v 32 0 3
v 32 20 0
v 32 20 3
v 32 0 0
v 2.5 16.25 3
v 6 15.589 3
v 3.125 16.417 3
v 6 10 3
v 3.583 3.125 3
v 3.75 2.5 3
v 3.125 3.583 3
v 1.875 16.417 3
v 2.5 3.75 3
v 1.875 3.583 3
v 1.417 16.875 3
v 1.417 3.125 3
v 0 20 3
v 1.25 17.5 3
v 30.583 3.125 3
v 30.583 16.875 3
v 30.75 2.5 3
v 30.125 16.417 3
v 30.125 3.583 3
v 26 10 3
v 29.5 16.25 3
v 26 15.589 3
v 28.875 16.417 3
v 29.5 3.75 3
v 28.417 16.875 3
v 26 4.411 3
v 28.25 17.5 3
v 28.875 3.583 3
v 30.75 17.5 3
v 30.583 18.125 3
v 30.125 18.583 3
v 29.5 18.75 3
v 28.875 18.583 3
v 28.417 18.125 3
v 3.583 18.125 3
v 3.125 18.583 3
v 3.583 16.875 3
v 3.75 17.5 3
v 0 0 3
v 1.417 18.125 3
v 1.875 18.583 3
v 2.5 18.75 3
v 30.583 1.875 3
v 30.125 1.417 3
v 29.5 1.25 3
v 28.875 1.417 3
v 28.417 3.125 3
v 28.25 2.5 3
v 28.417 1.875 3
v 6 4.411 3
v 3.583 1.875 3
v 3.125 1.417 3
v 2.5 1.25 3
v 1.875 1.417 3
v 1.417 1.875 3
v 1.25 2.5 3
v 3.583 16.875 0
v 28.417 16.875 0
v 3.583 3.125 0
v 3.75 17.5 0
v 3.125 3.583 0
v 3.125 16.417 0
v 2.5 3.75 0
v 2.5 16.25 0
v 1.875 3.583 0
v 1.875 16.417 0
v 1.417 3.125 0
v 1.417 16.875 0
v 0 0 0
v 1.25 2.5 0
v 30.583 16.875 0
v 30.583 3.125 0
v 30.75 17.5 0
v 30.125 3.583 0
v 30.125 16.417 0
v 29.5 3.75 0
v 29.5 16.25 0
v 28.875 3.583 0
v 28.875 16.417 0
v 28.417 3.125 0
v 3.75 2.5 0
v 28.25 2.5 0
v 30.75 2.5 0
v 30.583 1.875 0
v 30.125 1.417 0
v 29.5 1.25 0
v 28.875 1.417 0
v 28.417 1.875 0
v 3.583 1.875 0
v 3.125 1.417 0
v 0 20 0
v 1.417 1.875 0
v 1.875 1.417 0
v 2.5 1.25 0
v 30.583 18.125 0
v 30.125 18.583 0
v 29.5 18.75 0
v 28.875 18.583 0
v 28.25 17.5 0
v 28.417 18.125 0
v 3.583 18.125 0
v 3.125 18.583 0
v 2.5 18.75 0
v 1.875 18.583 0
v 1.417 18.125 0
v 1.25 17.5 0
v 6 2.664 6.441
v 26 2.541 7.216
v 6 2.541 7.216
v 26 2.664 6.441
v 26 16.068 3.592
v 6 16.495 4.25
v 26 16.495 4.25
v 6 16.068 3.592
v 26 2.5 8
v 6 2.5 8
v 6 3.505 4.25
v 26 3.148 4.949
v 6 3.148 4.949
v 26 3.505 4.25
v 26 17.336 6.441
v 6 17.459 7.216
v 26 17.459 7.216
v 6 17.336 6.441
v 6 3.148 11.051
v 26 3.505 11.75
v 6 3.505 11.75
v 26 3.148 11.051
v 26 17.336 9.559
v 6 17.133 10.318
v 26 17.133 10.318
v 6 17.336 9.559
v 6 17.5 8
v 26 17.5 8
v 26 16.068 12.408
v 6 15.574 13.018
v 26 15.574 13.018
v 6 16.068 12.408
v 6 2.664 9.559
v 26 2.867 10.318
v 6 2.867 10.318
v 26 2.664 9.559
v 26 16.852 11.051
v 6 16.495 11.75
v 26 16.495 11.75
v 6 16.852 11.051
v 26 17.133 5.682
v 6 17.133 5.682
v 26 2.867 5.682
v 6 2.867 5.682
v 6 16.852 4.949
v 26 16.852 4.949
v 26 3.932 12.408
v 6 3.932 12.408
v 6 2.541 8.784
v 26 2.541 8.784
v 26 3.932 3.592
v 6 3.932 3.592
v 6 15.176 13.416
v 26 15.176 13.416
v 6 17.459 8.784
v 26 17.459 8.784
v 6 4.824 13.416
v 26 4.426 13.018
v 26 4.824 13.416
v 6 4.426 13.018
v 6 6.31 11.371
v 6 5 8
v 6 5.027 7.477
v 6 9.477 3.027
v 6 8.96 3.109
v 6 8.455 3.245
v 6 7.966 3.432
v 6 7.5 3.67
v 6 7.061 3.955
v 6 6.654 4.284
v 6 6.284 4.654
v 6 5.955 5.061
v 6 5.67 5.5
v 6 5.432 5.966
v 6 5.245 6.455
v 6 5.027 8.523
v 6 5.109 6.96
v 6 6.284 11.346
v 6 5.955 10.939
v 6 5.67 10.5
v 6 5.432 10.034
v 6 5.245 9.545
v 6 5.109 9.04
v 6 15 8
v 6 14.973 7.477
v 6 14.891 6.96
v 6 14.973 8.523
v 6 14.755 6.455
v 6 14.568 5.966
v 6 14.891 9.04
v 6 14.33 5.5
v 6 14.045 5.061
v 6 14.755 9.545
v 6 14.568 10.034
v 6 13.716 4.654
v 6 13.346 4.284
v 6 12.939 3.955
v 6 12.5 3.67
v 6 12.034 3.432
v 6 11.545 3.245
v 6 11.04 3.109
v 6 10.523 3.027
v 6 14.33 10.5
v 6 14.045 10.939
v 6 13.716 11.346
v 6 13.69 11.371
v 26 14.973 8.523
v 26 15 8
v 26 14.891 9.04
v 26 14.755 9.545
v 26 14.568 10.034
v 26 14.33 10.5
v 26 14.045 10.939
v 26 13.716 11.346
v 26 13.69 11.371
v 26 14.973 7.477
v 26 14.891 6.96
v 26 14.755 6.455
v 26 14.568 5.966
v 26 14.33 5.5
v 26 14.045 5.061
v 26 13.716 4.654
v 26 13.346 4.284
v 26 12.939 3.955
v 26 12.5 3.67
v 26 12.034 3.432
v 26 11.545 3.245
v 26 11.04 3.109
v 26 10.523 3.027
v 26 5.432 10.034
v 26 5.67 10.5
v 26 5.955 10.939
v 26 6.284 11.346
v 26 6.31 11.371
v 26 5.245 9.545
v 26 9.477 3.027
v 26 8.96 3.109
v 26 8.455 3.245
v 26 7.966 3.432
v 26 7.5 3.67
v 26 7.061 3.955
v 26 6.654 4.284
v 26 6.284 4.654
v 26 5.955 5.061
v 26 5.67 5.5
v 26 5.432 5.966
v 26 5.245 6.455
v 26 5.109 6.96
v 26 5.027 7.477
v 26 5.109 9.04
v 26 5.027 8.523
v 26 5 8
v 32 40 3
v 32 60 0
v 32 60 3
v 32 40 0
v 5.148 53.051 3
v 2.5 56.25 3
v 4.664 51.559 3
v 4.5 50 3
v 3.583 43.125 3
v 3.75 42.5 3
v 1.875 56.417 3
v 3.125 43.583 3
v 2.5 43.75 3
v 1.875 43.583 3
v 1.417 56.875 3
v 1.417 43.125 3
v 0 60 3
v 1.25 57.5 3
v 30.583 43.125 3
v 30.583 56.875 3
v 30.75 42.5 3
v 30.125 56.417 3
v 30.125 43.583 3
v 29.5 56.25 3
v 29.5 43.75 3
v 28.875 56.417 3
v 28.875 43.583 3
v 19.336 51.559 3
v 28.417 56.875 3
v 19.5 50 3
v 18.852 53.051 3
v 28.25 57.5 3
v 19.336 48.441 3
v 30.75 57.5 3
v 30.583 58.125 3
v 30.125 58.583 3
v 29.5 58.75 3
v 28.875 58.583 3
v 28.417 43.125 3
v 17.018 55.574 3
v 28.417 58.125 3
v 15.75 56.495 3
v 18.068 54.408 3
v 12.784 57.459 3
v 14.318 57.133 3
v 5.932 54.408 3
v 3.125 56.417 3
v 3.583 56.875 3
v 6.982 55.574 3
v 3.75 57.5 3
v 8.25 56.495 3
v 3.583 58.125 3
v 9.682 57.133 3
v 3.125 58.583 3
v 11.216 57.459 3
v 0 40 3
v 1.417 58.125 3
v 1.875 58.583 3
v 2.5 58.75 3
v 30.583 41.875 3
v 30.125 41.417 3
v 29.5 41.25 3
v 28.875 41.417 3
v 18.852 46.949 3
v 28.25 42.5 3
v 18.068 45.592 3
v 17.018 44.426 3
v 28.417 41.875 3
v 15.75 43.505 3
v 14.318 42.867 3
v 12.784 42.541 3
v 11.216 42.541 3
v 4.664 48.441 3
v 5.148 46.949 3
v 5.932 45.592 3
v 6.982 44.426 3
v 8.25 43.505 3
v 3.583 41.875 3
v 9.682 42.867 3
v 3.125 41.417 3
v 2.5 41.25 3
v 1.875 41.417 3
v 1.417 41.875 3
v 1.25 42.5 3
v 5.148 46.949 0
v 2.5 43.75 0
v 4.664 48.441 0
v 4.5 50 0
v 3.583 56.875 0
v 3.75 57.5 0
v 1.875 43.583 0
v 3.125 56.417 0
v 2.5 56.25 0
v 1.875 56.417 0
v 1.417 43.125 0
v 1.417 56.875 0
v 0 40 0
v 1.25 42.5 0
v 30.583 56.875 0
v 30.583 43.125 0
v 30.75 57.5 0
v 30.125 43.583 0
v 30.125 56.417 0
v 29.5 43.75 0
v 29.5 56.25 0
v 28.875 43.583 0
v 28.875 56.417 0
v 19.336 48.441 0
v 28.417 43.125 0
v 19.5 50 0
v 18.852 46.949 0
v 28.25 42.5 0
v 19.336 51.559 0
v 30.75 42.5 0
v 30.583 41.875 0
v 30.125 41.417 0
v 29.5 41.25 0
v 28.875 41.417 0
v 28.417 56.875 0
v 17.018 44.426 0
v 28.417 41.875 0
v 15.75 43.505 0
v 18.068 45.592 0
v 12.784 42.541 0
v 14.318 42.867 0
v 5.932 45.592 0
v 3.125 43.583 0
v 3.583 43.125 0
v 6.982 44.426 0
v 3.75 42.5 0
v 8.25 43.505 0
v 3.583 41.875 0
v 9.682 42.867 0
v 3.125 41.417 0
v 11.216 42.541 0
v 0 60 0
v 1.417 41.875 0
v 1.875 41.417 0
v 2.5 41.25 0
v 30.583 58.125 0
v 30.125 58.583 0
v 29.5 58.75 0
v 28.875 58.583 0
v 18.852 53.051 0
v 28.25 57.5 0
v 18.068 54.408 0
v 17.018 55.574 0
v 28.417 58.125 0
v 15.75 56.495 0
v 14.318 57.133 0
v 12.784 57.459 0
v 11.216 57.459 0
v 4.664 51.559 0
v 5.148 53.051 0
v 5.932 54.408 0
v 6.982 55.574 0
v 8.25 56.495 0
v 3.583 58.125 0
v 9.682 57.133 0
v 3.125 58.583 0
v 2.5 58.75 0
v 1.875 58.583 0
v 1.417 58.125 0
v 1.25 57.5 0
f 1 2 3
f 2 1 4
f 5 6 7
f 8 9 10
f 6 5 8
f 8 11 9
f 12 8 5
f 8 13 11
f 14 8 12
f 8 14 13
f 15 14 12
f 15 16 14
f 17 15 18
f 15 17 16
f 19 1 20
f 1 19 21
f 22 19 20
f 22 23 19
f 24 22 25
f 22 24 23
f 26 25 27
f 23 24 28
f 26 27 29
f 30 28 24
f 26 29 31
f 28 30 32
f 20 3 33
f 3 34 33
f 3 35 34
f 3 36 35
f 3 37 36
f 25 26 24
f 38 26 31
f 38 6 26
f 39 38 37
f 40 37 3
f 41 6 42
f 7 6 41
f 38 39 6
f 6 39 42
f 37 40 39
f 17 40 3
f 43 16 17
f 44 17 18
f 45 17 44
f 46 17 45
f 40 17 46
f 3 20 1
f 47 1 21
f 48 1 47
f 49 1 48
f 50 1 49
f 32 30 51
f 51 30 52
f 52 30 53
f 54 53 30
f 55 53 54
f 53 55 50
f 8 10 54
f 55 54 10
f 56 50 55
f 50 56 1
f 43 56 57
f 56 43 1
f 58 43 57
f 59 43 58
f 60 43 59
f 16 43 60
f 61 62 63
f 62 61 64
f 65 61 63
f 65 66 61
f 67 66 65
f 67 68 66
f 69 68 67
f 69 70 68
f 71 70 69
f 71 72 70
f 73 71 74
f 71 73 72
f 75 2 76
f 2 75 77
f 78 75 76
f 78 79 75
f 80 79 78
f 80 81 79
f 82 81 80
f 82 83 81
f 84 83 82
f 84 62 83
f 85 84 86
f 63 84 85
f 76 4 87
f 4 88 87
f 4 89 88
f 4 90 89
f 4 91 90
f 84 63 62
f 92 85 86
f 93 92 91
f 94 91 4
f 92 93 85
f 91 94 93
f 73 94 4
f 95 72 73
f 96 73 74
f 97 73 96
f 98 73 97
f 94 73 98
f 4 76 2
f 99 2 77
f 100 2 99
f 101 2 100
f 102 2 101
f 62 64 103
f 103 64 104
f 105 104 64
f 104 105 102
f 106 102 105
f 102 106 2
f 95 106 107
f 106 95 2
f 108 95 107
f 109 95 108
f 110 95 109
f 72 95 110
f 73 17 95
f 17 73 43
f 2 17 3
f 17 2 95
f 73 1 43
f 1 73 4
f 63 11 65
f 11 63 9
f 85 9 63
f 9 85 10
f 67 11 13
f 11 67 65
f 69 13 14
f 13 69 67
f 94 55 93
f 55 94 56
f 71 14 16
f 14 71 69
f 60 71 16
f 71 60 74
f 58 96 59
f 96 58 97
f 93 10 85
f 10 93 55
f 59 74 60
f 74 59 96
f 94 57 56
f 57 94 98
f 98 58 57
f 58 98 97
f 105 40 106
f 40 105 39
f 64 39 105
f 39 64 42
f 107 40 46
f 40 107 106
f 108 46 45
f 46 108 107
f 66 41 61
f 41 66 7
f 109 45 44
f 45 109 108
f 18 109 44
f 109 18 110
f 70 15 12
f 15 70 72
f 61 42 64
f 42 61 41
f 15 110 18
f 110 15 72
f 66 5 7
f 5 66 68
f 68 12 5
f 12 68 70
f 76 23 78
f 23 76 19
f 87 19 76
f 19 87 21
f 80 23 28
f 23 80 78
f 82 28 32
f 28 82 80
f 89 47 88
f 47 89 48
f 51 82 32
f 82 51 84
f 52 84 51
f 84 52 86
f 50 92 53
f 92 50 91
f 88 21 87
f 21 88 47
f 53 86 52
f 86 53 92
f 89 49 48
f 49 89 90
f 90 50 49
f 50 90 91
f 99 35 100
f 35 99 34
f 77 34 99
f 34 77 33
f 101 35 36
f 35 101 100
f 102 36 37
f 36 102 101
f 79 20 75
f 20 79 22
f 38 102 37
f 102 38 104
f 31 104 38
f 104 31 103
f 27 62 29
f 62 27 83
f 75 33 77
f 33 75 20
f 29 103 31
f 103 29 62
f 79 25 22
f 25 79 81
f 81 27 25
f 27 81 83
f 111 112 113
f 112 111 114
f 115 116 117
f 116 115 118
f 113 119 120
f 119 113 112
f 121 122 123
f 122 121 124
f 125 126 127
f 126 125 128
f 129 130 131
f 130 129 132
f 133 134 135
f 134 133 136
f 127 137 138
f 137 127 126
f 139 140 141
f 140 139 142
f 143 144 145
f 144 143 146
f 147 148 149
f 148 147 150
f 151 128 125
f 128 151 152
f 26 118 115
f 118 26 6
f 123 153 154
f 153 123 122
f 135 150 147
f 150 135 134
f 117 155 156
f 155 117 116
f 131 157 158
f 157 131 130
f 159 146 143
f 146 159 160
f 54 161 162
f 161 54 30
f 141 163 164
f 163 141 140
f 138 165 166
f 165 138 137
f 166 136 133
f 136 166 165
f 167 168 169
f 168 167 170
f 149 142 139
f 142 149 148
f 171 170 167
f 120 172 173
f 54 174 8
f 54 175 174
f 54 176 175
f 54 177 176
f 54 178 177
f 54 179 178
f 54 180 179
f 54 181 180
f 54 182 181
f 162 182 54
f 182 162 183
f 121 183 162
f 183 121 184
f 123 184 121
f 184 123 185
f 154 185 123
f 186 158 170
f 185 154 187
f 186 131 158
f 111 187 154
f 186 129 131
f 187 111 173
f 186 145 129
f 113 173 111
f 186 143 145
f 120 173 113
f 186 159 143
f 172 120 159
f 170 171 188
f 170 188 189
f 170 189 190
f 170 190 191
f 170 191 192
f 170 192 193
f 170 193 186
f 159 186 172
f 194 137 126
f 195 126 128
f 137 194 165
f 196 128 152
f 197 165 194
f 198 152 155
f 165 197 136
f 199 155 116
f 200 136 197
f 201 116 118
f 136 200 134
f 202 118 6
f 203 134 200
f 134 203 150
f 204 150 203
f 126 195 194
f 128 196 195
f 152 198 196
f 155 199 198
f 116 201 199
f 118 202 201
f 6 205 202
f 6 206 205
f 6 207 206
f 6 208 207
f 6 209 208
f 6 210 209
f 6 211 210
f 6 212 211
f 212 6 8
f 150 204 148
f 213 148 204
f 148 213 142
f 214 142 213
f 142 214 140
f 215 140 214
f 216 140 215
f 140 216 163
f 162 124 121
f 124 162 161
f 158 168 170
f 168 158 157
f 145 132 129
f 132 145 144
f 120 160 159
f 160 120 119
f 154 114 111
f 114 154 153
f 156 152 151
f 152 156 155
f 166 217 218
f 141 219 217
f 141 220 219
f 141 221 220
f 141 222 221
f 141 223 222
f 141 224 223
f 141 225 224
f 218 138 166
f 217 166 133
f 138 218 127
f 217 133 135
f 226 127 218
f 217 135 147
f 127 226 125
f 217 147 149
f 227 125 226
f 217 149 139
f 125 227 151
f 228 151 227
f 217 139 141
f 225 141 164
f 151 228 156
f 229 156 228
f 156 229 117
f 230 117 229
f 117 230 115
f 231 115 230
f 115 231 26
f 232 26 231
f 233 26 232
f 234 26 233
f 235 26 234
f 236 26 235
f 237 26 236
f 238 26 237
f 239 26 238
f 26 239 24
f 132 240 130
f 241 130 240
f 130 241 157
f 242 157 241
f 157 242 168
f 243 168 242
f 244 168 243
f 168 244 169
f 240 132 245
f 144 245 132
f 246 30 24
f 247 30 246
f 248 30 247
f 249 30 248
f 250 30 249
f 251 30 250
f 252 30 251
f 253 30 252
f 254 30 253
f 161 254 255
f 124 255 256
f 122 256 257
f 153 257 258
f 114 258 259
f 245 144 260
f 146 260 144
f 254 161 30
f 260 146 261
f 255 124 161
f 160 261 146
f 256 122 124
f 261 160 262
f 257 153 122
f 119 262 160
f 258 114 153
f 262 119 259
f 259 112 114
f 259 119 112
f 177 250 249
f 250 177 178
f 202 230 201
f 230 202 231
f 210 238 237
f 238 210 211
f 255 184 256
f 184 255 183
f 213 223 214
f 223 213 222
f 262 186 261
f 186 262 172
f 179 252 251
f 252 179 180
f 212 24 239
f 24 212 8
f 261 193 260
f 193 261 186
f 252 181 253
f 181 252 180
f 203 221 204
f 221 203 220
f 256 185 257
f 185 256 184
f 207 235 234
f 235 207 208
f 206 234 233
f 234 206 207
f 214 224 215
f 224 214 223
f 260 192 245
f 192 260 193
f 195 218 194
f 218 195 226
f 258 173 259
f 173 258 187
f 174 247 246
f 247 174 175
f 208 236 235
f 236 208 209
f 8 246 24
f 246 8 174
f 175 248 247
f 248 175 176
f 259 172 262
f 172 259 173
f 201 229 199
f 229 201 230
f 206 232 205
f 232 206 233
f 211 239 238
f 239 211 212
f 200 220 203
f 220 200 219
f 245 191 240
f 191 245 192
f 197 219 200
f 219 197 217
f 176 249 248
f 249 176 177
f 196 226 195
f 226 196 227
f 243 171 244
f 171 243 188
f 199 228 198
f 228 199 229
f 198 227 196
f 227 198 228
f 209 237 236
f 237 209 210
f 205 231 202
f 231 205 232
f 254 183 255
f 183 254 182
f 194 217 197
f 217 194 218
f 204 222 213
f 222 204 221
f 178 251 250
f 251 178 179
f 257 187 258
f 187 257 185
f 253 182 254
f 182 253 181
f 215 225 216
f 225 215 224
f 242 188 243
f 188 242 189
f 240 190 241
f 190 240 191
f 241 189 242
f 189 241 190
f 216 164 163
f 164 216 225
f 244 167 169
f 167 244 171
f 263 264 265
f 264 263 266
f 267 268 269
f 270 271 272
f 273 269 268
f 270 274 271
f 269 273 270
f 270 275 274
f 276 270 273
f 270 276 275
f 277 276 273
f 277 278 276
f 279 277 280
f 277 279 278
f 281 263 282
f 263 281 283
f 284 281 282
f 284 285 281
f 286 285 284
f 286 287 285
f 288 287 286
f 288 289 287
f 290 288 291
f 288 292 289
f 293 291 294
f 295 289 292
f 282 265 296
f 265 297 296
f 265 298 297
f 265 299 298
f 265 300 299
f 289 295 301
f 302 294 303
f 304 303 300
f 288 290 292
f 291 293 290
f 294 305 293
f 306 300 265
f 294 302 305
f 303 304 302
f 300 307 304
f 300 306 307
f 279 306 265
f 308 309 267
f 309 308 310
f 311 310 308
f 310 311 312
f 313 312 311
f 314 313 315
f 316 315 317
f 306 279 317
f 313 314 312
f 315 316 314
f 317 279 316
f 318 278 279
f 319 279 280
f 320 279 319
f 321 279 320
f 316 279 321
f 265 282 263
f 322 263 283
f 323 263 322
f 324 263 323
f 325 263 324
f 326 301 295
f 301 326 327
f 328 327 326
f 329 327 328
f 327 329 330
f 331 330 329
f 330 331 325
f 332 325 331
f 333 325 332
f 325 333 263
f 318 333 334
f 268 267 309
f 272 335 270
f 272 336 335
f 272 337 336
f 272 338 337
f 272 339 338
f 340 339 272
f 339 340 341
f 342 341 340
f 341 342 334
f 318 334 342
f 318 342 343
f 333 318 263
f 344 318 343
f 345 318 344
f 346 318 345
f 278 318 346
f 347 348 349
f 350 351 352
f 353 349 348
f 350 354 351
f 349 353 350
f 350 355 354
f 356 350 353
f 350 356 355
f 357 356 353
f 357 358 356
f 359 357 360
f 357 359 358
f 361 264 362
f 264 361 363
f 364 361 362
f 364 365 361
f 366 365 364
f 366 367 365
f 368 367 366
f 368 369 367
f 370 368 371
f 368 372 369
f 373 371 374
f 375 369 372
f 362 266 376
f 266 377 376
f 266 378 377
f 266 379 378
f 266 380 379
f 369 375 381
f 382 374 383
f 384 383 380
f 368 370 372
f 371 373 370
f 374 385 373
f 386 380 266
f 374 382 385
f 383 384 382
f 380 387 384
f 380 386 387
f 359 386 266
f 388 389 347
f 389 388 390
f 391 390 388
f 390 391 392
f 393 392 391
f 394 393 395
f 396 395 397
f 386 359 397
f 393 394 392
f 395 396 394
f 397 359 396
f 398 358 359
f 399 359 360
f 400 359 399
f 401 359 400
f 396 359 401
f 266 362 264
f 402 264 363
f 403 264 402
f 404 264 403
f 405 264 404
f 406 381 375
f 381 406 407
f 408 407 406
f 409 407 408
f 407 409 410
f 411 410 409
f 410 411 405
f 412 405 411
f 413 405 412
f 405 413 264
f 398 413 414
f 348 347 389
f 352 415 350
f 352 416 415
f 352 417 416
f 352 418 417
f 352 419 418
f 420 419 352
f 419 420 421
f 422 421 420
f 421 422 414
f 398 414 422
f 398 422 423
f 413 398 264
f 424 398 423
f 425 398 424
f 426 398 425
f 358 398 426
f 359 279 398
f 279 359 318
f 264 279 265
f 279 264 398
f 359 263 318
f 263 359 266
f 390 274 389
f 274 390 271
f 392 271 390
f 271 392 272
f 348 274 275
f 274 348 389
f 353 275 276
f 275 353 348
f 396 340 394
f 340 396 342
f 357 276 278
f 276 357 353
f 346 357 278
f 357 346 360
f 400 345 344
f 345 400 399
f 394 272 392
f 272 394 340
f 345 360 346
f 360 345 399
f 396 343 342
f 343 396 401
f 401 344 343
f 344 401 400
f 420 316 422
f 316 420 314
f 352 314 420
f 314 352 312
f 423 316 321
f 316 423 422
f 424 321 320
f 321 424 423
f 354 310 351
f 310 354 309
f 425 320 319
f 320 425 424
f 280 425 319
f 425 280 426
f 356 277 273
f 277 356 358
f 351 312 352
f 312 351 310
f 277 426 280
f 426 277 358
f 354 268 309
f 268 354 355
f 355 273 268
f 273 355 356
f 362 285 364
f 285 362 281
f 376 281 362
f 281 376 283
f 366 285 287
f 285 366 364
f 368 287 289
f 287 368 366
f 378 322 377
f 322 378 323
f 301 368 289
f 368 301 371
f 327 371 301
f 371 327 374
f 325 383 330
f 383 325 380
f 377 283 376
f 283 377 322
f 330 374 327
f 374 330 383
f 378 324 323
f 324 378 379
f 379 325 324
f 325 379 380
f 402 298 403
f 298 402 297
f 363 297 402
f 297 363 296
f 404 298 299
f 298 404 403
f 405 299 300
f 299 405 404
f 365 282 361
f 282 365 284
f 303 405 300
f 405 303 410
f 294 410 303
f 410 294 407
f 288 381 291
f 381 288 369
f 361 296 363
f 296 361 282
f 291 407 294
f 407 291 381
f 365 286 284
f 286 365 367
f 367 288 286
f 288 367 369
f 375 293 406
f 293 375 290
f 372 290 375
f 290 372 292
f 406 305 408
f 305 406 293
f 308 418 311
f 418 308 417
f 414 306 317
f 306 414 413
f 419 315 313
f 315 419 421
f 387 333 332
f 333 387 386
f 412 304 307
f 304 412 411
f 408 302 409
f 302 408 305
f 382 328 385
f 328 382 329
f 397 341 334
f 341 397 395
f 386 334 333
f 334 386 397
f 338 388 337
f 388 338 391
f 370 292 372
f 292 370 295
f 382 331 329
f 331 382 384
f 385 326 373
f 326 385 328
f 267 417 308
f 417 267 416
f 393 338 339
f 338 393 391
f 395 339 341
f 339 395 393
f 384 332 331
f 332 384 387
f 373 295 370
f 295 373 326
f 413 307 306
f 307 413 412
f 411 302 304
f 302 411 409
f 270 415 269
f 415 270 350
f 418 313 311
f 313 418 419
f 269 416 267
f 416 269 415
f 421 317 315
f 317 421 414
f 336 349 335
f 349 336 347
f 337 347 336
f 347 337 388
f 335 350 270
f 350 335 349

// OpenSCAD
difference(){
    cube([32,20,3]);
    translate([2.5,2.5,0])
    cylinder(d=2.5,h=4,$fn=12);
    translate([2.5,17.5,0])
    cylinder(d=2.5,h=4,$fn=12);
    translate([29.5,2.5,0])
    cylinder(d=2.5,h=4,$fn=12);
    translate([29.5,17.5,0])
    cylinder(d=2.5,h=4,$fn=12);
}
difference(){
translate([6,10,8])rotate([0,90,0])
    cylinder(d=15,h=20,$fn=60);
translate([5,10,8])rotate([0,90,0])
    cylinder(d=10,h=22,$fn=60);
translate([5,10,16])rotate([0,90,0])
    cylinder(d=12,h=22,$fn=10);
}

translate([0,40,0])
difference(){
    cube([32,20,3]);
    translate([2.5,2.5,0])
    cylinder(d=2.5,h=4,$fn=12);
    translate([2.5,17.5,0])
    cylinder(d=2.5,h=4,$fn=12);
    translate([29.5,2.5,0])
    cylinder(d=2.5,h=4,$fn=12);
    translate([29.5,17.5,0])
    cylinder(d=2.5,h=4,$fn=12);
    translate([12,10,0])
    cylinder(d=15,h=4,$fn=30);
    
}
